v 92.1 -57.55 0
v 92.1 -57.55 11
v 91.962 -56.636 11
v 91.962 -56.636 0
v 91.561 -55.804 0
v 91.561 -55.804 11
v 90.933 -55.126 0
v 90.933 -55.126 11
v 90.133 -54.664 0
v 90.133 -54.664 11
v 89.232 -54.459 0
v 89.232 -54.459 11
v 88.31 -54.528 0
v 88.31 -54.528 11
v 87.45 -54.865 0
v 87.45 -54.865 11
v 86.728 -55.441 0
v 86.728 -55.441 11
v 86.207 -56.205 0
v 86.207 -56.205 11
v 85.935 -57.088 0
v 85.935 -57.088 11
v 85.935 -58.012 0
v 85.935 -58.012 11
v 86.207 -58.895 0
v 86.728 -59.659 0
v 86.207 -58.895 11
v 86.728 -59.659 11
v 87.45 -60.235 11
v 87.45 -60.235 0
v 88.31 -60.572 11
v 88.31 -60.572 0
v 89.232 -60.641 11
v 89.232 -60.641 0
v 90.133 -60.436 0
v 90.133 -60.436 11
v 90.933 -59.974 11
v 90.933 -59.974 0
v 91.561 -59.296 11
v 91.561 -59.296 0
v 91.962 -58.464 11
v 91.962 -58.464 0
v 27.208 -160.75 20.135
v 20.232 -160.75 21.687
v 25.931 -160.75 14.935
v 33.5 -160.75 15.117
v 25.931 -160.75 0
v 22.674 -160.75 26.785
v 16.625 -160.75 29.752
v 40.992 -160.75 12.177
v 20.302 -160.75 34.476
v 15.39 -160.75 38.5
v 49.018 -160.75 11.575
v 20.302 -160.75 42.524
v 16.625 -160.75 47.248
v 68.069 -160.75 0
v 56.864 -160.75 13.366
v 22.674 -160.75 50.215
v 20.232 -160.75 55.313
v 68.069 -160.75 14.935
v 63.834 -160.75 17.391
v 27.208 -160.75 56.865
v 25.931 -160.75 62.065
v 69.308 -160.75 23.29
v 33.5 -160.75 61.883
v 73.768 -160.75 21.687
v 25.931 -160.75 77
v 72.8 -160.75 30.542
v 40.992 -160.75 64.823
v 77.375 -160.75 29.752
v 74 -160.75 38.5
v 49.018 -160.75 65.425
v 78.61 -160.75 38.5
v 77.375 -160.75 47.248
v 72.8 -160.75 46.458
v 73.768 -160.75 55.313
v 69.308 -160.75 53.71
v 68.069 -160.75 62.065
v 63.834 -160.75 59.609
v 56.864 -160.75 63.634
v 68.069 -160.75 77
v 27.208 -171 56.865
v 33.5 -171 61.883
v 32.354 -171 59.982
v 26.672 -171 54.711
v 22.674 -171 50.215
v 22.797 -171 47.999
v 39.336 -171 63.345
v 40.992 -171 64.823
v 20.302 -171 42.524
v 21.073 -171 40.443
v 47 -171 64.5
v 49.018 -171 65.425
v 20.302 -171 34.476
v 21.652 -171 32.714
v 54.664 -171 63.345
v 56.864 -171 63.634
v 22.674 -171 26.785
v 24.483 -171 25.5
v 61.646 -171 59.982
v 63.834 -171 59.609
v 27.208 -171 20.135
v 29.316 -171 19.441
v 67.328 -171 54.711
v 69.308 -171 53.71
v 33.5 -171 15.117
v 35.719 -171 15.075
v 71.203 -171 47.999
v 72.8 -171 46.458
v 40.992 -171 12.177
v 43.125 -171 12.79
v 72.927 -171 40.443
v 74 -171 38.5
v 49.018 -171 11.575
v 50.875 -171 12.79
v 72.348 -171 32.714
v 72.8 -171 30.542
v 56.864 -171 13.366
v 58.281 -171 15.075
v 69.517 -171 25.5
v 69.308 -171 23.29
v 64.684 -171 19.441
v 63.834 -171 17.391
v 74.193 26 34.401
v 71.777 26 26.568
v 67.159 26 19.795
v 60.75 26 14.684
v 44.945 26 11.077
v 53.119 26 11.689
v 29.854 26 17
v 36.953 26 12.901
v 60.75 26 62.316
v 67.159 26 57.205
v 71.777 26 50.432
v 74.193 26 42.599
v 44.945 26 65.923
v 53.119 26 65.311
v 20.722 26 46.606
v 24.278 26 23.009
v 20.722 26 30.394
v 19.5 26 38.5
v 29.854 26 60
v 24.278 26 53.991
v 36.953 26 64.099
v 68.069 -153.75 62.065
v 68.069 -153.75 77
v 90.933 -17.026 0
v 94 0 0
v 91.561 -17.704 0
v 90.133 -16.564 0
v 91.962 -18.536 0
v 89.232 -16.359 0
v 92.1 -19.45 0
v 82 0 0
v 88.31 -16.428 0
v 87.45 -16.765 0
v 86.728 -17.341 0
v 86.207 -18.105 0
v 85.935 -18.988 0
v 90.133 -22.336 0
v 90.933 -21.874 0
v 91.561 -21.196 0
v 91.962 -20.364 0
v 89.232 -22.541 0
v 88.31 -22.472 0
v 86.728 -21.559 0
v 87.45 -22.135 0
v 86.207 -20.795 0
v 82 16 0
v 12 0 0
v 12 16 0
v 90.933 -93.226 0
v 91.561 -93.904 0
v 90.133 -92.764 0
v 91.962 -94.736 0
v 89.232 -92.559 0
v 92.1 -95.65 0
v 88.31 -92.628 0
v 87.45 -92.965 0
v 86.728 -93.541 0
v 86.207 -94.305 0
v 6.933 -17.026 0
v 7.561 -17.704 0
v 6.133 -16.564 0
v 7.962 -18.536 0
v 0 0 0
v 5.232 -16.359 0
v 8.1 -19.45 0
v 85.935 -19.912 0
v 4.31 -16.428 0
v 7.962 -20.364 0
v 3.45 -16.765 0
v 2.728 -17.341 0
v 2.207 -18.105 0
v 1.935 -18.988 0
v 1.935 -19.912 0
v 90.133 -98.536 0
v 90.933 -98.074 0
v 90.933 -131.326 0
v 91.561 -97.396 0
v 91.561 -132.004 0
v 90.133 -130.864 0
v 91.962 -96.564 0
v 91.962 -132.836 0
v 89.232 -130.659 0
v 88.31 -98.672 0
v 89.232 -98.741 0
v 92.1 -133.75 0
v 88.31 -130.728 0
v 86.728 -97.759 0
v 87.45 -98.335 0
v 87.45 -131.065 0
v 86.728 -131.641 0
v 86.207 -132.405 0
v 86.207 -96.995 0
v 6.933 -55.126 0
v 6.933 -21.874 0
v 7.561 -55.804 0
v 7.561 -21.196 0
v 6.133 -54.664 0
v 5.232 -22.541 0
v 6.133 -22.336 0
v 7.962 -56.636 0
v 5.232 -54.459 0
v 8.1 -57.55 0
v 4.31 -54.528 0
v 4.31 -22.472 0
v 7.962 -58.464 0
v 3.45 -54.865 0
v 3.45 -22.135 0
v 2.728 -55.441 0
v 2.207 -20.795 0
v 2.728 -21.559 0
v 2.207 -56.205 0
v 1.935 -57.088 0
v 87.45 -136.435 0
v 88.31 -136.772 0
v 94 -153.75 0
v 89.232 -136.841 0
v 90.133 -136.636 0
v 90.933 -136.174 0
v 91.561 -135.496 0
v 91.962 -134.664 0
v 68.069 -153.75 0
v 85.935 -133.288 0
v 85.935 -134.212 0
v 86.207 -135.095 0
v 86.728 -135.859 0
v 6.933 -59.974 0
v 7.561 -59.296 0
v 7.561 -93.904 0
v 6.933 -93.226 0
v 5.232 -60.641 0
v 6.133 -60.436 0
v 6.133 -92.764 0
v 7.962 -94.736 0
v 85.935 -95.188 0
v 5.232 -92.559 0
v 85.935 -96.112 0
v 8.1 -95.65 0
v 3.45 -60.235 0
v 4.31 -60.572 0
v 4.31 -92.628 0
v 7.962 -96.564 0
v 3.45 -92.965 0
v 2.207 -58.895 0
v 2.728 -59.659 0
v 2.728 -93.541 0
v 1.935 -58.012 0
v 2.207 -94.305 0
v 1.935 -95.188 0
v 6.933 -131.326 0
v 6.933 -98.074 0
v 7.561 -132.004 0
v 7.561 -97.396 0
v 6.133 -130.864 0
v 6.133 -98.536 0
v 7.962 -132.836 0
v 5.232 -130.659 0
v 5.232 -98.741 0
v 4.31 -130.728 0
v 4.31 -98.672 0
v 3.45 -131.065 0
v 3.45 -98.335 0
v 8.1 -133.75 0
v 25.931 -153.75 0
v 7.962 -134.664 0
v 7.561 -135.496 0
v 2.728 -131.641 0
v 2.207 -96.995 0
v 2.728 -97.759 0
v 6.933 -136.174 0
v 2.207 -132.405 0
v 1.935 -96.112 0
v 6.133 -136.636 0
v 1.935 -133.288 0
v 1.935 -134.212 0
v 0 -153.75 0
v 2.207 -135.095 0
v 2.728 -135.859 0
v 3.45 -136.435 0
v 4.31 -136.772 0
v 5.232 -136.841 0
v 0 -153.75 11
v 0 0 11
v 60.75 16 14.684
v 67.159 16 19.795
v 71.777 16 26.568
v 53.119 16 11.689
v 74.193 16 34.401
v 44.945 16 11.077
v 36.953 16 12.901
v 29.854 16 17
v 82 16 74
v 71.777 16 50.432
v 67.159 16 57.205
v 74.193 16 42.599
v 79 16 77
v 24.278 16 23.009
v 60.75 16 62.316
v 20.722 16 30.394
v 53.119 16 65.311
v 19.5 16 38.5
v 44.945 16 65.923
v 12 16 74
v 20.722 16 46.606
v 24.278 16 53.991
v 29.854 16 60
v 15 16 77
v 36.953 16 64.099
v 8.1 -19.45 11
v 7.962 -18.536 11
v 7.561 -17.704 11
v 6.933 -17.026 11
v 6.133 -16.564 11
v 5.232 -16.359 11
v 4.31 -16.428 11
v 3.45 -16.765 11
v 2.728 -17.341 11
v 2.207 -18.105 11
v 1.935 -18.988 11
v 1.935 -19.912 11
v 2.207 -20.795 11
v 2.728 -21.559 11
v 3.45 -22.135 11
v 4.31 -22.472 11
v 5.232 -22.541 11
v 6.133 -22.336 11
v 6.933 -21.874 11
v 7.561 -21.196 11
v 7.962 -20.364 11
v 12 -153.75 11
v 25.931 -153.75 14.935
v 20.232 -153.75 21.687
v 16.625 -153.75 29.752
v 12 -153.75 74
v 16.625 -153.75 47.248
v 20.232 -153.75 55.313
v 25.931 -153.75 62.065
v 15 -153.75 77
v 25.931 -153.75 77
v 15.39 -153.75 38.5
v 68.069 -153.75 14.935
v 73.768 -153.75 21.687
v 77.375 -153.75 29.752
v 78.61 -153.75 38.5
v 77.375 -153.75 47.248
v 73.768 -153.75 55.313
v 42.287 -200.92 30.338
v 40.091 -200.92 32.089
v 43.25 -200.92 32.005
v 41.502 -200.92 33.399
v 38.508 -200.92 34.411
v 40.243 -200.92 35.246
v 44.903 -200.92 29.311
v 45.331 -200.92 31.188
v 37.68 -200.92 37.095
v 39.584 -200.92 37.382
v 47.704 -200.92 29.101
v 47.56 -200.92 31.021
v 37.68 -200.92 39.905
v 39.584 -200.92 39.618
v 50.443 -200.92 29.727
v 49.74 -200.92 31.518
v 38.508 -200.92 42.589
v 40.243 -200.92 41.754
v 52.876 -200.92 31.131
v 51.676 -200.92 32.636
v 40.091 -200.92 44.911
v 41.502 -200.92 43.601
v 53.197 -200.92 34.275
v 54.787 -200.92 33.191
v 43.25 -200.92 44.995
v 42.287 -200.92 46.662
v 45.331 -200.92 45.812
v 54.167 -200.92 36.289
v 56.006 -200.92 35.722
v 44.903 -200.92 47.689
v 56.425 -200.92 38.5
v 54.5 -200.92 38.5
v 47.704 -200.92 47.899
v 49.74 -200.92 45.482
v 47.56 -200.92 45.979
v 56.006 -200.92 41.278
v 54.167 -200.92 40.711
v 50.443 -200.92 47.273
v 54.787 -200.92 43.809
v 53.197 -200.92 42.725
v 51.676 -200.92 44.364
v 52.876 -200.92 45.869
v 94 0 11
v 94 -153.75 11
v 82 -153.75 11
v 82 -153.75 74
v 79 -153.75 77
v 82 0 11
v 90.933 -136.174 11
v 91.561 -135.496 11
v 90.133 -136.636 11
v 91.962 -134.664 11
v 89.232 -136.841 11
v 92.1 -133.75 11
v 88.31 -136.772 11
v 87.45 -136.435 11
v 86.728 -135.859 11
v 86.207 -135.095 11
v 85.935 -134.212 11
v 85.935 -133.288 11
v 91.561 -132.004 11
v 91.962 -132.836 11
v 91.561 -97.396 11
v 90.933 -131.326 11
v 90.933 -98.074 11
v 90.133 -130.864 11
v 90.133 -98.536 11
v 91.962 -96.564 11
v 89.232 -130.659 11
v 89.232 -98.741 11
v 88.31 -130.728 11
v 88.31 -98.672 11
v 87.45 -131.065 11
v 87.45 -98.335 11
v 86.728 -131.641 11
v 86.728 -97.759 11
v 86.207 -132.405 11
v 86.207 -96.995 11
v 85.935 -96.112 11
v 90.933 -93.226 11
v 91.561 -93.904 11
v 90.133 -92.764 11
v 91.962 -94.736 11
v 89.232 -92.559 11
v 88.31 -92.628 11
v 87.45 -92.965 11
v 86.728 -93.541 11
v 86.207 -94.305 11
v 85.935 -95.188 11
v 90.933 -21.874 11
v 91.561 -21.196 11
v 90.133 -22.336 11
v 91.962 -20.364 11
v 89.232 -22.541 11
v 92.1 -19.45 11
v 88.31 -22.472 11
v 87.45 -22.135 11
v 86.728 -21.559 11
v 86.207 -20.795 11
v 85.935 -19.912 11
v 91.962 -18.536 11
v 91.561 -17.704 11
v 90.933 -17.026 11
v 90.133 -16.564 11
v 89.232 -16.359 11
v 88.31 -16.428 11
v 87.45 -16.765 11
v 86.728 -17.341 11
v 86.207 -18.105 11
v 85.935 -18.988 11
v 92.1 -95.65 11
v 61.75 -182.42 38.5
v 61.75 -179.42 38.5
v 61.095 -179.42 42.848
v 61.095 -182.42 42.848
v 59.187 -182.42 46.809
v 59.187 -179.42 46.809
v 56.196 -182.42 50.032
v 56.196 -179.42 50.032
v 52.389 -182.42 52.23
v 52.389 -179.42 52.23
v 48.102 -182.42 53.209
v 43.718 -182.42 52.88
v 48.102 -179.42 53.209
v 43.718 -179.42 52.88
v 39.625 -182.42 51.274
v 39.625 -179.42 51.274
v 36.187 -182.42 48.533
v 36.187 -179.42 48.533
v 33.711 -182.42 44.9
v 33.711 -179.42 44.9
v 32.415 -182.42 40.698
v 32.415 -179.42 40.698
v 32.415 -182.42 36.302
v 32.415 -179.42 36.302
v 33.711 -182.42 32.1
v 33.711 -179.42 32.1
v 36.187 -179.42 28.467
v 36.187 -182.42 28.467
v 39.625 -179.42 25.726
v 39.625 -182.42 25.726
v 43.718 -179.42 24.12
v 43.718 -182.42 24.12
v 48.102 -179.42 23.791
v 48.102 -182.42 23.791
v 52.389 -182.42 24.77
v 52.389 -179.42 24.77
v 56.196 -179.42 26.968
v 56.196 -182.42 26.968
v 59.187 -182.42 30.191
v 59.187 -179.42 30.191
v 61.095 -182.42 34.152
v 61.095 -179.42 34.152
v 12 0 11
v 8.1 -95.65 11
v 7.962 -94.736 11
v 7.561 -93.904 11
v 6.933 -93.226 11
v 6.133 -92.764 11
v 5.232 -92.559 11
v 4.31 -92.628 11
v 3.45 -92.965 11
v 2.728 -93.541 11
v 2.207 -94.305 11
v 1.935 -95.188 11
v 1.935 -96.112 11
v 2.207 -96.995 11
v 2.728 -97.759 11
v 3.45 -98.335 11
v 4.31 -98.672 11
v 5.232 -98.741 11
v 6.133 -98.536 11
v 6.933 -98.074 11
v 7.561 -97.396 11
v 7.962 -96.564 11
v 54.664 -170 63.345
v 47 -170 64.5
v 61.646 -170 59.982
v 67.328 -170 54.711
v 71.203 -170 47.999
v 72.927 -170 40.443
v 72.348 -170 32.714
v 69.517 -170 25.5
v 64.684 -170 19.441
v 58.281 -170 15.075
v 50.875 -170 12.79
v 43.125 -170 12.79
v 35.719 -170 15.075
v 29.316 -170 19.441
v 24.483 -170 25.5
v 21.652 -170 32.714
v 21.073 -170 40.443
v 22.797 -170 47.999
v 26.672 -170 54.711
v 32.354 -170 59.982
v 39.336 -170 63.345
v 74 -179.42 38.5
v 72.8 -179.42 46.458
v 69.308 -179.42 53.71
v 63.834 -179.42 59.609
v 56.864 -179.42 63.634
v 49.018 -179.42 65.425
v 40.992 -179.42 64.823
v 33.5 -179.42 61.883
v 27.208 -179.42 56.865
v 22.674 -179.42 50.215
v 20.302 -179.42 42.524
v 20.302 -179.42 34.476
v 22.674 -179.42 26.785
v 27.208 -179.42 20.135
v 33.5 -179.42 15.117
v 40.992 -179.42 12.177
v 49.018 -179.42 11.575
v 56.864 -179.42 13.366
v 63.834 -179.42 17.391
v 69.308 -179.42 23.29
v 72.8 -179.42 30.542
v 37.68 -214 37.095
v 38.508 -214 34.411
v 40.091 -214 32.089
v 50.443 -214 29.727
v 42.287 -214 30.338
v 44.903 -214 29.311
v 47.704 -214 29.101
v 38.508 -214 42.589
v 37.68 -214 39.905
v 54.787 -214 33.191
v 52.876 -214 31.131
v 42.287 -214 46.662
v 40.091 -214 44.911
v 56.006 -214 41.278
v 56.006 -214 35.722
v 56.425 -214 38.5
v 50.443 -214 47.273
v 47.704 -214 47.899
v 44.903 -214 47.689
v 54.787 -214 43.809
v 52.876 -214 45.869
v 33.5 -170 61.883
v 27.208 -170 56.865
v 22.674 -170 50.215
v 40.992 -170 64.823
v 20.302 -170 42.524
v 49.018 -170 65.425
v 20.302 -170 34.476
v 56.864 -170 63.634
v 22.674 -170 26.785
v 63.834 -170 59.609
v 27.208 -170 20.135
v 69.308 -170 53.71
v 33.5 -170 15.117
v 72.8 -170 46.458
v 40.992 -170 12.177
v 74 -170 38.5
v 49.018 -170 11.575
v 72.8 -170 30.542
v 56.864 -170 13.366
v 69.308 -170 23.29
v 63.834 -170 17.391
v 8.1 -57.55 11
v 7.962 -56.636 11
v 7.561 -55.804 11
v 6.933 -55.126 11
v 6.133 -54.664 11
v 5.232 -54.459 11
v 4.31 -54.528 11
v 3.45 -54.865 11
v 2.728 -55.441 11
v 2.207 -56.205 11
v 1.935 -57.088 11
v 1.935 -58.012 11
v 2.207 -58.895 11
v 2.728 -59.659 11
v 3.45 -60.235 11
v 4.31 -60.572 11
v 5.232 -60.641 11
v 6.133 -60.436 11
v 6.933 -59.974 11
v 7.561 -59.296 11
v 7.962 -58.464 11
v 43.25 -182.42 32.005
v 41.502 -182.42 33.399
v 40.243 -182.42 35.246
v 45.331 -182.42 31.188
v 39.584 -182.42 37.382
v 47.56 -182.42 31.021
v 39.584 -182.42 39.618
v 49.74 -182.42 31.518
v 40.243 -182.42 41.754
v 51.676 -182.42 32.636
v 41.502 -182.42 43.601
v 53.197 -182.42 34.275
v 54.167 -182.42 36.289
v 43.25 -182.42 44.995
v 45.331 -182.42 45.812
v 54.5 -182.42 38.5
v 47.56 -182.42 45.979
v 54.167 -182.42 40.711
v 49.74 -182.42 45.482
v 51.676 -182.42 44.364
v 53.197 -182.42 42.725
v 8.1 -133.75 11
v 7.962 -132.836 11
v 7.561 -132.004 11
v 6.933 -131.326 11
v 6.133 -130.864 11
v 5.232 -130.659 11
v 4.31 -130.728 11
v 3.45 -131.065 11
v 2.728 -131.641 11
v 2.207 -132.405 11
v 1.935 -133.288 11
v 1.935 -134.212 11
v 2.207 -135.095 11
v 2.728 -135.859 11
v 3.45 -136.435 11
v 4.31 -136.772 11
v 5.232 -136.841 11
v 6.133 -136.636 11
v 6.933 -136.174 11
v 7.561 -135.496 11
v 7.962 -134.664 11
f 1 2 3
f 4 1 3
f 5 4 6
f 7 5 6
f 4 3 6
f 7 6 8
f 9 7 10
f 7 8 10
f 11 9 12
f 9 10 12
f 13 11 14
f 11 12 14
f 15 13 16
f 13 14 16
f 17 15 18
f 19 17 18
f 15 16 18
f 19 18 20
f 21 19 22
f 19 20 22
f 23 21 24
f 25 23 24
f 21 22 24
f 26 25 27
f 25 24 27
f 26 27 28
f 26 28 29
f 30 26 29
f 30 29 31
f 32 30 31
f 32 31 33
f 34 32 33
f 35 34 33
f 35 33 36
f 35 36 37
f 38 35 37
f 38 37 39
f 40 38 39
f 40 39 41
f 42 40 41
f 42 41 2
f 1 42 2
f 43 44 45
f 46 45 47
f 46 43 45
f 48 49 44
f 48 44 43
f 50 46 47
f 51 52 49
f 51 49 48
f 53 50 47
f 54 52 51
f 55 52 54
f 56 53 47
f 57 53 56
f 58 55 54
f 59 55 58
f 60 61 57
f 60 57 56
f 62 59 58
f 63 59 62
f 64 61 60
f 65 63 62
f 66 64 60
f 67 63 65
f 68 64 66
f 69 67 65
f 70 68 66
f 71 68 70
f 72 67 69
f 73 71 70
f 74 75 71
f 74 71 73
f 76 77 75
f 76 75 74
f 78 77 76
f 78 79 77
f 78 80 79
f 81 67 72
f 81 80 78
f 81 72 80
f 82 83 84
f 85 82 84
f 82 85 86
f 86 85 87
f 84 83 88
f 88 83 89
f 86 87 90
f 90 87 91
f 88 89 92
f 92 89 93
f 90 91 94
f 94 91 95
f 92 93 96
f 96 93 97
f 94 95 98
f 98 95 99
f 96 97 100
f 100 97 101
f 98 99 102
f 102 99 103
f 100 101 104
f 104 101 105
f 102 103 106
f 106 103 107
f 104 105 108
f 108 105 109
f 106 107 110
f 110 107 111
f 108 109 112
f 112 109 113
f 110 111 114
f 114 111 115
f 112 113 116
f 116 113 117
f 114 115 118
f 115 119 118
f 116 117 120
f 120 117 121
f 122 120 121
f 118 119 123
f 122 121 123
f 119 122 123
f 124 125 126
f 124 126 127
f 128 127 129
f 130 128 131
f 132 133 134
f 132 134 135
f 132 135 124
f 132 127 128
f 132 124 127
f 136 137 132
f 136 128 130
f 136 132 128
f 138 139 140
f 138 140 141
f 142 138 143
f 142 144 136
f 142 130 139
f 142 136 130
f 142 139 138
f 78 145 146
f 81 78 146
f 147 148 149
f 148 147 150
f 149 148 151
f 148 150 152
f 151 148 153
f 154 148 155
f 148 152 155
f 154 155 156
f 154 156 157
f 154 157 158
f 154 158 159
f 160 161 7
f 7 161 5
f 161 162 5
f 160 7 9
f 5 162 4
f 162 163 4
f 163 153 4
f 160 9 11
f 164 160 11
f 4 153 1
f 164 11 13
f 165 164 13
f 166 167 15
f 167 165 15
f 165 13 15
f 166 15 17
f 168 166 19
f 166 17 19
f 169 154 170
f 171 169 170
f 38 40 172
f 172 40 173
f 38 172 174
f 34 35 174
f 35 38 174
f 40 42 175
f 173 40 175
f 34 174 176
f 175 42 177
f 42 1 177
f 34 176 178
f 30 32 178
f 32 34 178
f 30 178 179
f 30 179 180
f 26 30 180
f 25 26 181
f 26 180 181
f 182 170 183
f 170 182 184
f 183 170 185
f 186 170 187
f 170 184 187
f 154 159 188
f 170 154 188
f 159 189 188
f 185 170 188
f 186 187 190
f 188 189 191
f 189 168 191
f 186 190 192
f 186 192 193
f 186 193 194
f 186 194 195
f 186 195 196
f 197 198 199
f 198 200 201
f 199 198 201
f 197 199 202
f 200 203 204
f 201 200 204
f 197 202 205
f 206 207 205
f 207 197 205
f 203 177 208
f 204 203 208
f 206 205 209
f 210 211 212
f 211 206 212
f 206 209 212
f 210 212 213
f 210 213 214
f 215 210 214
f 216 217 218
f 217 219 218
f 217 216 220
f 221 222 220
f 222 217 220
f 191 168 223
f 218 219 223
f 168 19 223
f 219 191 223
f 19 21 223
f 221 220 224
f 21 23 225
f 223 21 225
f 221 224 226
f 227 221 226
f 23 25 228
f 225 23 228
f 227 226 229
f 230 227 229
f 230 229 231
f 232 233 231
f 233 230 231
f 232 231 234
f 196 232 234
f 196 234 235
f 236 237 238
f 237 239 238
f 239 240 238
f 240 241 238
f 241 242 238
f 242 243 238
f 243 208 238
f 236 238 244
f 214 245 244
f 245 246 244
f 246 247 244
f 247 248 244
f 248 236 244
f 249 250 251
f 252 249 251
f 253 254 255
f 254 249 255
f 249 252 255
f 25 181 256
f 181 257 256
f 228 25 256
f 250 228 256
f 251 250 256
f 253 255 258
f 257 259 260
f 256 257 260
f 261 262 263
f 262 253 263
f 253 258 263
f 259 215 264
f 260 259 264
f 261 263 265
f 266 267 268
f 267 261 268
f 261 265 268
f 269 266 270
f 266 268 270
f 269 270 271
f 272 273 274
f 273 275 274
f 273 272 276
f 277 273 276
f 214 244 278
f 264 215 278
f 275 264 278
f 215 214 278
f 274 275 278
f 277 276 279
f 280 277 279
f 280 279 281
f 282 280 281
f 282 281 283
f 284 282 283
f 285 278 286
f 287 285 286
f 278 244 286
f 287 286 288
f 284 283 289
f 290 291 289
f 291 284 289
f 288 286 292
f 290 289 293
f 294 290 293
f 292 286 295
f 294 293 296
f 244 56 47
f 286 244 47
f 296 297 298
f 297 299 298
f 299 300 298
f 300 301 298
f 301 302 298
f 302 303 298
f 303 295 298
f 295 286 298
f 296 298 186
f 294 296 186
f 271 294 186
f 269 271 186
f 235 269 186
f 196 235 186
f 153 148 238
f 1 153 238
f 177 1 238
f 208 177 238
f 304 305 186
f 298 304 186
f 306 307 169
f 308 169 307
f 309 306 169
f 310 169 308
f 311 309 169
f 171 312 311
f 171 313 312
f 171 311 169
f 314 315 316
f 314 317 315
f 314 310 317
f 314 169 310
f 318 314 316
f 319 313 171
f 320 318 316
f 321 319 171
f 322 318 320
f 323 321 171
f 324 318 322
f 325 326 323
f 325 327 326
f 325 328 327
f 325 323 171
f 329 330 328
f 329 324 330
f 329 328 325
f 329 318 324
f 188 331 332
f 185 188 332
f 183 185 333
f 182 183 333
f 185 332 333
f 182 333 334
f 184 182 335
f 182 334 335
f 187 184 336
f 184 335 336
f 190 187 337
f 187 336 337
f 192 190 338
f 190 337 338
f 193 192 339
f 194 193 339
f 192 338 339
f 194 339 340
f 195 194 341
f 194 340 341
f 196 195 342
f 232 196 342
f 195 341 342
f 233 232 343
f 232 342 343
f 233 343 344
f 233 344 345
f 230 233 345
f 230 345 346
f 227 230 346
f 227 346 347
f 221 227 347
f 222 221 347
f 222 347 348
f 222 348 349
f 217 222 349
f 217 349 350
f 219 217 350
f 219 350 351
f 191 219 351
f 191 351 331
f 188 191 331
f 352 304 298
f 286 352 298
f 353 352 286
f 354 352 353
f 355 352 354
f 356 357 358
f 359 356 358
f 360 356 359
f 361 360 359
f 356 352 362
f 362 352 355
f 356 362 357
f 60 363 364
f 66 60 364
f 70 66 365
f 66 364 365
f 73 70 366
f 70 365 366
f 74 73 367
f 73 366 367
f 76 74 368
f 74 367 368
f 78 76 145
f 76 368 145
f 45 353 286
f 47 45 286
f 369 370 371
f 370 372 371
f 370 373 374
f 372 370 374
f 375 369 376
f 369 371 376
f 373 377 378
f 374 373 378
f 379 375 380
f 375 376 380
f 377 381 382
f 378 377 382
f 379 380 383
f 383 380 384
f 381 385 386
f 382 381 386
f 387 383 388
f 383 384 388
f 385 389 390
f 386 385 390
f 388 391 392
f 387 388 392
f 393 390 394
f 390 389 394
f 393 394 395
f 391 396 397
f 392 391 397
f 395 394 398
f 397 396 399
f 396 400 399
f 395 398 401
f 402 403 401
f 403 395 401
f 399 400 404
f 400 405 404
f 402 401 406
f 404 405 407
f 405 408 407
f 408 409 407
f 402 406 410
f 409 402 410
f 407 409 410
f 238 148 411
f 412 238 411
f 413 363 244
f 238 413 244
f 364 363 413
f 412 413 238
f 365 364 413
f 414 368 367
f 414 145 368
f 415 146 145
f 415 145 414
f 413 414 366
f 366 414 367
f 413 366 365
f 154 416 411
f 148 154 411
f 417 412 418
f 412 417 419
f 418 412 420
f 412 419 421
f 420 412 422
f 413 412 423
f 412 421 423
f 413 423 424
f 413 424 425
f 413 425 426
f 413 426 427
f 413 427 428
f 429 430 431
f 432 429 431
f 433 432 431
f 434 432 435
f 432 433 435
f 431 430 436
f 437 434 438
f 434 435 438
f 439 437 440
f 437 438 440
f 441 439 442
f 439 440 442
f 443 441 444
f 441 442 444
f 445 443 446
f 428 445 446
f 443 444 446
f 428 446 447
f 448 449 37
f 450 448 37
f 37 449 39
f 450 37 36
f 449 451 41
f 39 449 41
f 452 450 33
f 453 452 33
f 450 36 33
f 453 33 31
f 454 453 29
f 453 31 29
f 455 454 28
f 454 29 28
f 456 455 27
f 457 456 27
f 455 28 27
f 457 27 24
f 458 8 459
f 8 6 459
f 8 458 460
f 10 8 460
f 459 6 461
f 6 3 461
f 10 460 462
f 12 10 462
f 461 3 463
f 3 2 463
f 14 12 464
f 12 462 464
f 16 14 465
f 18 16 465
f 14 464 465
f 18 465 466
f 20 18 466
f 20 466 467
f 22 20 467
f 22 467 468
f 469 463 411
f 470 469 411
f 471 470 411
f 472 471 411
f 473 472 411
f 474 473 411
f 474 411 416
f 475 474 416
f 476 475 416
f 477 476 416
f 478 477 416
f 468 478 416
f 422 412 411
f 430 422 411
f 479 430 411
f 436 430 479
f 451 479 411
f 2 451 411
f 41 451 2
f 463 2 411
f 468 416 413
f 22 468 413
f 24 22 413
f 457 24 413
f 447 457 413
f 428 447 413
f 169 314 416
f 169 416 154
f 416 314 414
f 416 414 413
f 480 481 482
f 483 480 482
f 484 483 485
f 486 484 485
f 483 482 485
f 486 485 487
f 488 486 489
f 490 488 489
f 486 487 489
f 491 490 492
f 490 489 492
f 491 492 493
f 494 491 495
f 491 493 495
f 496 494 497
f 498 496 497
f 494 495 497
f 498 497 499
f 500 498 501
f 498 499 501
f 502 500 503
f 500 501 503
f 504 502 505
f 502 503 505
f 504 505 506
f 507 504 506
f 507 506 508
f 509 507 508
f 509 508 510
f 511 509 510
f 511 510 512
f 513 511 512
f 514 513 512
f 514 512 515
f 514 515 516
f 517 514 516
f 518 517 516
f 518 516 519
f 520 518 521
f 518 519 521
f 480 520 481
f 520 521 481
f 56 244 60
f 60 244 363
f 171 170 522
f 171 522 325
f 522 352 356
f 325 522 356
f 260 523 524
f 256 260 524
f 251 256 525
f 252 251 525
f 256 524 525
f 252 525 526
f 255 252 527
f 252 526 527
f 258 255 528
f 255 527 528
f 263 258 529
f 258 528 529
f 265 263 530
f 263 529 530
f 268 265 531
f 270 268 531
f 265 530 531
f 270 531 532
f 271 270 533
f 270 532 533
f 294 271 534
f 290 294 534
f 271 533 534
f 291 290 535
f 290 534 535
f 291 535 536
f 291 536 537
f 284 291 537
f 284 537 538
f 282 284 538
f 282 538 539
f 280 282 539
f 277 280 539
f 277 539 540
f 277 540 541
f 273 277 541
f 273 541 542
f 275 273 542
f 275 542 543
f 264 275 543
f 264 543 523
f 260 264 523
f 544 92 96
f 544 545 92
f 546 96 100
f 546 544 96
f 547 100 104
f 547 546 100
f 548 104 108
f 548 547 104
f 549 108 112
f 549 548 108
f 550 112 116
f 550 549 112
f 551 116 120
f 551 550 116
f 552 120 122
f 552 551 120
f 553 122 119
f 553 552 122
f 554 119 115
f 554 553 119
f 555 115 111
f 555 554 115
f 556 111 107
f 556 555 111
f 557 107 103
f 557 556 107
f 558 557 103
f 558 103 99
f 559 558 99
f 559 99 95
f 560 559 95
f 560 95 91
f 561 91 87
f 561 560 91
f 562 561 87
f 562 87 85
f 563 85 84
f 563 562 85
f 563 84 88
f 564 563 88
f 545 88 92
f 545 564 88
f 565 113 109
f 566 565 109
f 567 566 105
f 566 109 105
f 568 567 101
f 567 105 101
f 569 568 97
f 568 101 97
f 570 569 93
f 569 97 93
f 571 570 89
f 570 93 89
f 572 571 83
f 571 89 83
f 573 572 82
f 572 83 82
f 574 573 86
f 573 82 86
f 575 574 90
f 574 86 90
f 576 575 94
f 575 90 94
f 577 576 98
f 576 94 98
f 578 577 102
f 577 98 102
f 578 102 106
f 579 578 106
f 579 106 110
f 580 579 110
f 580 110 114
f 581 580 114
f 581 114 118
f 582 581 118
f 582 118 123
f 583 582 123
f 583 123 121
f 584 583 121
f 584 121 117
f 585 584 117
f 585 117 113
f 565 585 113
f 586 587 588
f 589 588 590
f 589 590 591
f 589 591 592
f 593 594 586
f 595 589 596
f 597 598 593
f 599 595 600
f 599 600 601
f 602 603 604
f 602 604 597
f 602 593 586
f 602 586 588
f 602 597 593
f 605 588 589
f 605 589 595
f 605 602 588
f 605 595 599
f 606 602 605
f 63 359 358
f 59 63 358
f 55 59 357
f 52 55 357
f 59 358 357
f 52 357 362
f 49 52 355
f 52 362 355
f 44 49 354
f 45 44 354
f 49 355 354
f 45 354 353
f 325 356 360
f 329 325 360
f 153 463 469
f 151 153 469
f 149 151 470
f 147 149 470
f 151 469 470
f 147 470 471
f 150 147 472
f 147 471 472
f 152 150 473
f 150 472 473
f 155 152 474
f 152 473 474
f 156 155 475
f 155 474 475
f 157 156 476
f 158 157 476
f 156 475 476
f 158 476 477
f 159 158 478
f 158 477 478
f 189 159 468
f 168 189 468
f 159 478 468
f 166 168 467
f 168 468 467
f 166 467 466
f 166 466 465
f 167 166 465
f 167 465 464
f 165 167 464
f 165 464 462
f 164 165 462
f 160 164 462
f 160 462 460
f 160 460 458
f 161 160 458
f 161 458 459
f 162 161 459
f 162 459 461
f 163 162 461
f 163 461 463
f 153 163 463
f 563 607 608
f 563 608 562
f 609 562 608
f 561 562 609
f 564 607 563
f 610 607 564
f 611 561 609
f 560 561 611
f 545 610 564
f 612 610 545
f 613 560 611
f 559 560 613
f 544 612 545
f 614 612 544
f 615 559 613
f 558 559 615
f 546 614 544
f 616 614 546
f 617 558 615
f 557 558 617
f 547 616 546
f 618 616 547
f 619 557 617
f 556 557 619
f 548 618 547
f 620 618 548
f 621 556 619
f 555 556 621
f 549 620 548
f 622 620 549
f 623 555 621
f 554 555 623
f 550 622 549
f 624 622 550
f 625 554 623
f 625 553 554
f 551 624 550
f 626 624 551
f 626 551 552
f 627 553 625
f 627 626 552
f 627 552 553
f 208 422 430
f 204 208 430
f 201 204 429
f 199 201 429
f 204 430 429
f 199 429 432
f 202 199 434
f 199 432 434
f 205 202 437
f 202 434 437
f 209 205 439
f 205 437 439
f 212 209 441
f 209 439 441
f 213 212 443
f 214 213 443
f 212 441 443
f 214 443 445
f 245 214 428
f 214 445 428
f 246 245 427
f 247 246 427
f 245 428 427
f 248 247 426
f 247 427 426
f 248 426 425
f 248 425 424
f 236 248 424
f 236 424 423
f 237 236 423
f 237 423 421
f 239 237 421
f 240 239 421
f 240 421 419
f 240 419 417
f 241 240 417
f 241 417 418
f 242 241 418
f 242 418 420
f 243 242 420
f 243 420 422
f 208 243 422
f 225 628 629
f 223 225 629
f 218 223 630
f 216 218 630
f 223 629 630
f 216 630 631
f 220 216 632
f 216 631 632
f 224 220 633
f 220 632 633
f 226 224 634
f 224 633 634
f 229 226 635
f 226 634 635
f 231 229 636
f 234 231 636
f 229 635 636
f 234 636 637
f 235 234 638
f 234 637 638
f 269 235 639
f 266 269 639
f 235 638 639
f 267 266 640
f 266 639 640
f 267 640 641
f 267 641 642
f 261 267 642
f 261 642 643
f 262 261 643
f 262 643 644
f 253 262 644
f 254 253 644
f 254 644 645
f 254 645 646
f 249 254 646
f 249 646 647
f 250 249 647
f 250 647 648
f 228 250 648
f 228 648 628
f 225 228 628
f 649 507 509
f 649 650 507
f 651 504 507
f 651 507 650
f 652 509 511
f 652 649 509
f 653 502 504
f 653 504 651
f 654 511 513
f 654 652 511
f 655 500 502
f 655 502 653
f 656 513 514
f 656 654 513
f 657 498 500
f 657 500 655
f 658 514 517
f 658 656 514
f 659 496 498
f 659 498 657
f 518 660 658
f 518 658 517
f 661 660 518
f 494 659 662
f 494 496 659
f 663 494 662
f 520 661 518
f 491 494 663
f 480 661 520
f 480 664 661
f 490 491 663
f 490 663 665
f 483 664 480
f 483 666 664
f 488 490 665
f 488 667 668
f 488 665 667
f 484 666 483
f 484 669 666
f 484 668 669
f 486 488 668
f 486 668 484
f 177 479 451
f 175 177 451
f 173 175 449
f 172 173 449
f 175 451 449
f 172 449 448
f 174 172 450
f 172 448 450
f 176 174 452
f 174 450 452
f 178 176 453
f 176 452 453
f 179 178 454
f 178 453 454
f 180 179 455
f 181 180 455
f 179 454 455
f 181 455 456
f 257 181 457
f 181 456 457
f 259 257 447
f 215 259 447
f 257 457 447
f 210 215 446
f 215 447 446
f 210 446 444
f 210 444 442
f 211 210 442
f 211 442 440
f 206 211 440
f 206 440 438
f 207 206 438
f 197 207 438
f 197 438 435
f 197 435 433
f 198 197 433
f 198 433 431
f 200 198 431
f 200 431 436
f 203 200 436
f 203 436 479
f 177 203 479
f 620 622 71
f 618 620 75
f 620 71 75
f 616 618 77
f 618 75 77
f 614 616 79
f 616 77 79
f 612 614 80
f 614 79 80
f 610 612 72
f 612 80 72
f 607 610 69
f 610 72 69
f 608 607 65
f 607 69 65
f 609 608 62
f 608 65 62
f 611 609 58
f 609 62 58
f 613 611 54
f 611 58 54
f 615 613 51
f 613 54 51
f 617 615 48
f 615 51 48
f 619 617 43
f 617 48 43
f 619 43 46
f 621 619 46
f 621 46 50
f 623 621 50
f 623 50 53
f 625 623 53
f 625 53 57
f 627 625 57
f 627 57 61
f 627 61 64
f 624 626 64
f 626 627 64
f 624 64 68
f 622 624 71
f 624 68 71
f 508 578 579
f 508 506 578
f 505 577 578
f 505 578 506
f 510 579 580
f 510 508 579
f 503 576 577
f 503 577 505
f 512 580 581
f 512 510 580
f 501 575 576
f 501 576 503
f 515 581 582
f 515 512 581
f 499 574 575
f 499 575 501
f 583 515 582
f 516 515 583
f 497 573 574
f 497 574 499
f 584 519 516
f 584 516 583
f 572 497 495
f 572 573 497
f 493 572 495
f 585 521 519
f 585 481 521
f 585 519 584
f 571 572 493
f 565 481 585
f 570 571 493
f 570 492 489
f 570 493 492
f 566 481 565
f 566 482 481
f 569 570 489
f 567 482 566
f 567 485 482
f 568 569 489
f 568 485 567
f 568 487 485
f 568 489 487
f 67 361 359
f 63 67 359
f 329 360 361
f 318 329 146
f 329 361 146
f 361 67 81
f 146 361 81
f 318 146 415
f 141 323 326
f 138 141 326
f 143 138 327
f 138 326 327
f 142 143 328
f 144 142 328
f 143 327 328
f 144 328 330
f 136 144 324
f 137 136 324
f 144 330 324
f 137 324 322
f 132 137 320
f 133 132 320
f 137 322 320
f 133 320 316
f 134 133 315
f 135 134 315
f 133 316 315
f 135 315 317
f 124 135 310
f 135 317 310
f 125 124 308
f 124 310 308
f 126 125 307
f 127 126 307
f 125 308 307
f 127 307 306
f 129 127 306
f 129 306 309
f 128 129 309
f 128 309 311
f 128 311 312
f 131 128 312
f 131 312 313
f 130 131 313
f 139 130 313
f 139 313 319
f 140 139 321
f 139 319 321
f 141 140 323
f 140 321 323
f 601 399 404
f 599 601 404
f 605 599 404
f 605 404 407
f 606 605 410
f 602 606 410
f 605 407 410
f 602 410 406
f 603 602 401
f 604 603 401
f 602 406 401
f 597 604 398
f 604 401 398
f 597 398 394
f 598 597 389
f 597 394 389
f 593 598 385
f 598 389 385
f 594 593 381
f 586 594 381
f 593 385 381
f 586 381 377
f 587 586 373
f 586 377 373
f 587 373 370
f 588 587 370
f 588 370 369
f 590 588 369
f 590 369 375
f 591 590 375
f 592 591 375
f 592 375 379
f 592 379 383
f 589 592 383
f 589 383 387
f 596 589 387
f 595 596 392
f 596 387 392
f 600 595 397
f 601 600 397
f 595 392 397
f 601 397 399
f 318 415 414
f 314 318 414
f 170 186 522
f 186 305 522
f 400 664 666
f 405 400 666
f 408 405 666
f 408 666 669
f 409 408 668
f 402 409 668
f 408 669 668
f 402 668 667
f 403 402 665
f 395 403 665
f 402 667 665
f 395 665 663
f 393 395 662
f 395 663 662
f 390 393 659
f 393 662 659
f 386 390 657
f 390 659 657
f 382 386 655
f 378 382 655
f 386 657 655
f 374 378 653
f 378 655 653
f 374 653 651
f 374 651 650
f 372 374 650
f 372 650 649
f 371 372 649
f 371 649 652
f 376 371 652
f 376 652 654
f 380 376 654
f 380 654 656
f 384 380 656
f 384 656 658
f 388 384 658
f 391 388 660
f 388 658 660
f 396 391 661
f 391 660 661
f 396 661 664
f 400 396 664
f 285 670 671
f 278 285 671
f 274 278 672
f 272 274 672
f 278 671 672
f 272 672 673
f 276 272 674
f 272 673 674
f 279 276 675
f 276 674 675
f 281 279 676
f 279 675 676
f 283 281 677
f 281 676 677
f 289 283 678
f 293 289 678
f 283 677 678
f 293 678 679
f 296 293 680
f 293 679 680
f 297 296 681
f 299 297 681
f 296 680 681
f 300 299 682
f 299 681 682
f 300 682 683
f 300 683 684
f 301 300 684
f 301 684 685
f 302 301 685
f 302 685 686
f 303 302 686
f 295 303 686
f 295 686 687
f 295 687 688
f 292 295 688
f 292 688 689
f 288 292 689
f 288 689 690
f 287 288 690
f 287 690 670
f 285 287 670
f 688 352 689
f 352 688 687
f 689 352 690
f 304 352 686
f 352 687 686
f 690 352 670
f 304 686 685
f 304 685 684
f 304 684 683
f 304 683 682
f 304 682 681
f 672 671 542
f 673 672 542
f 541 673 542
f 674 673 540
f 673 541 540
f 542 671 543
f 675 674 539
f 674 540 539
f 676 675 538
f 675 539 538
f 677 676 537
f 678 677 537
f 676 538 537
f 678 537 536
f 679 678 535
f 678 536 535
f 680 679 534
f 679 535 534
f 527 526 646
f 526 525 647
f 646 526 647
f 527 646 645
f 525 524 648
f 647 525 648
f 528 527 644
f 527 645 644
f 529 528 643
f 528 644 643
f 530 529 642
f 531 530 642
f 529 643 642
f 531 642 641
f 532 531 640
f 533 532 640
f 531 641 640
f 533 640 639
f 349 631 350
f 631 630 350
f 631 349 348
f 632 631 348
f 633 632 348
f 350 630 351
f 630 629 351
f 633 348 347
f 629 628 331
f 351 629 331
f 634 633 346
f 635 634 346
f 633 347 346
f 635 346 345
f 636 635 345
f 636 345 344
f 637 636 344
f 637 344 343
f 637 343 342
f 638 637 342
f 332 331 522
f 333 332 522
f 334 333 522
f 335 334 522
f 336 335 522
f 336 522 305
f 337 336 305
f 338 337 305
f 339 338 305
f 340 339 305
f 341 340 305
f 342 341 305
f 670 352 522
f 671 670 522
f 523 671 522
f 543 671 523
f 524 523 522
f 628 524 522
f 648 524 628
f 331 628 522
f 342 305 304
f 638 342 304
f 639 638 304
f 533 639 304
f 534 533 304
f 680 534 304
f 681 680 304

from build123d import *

# Parameters (mm, degrees)
F1_DEPTH  = 153.75
F2_SIZE   = 3
F3_R      = 3.1
F4_DEPTH  = 11.001
F6_DEPTH  = 7
F7_R      = 27
F8_DEPTH  = 18.67
F9_R      = 14.75
F10_DEPTH = 3
F12_W     = 1
F12_H     = 1
F14_R     = 7.5
F15_DEPTH = 18.5
F16_R     = 9.425
F16_R_2   = 7.5
F17_DEPTH = 13.08
F19_DEPTH = 16
F20_R     = 27.5
F21_DEPTH = 10


# Not quite as in the source:
# - the program builds the solid bodies; features that only make, move or delete a surface that nothing else refers to are left out


with BuildPart() as f1:
    # F0 (on Front) → F1 (new body)
    with BuildSketch(Plane.XZ):
        Polygon((0, 11), (0, 0), (94, 0), (94, 11), (82, 11), (82, 77), (12, 77), (12, 11), align=None)
    extrude(amount=F1_DEPTH)

    # F2
    f2_edges = [f1.edges().sort_by_distance(p)[0] for p in [
        (12, -76.875, 77),
        (82, -76.875, 77),
    ]]
    chamfer(f2_edges, length=F2_SIZE)

    # F3 (on face) → F4 (cut, through all)
    with BuildSketch(Plane.XY.offset(11)):
        with Locations((89, -133.75)):
            Circle(F3_R)
        with Locations((89, -95.65)):
            Circle(F3_R)
        with Locations((89, -57.55)):
            Circle(F3_R)
        with Locations((89, -19.45)):
            Circle(F3_R)
        with Locations((5, -19.45)):
            Circle(F3_R)
        with Locations((5, -57.55)):
            Circle(F3_R)
        with Locations((5, -95.65)):
            Circle(F3_R)
        with Locations((5, -133.75)):
            Circle(F3_R)
    extrude(amount=-F4_DEPTH, mode=Mode.SUBTRACT)

    # F5 (on face) → F6 (join)
    with BuildSketch(Plane.XZ.offset(153.75)):
        with BuildLine():
            Line((25.9310321962, 77), (25.9310321962, 62.0646068434))
            ThreePointArc((25.9310321962, 62.0646068434), (15.39, 38.5), (25.9310321962, 14.9353931566))
            Line((25.9310321962, 14.9353931566), (25.9310321962, 0))
            Line((25.9310321962, 0), (68.0689678038, 0))
            Line((68.0689678038, 0), (68.0689678038, 14.9353931566))
            ThreePointArc((68.0689678038, 14.9353931566), (78.61, 38.5), (68.0689678038, 62.0646068434))
            Line((68.0689678038, 62.0646068434), (68.0689678038, 77))
            Line((68.0689678038, 77), (25.9310321962, 77))
        make_face()
    extrude(amount=F6_DEPTH)

    # F7 (on face) → F8 (join)
    with BuildSketch(Plane.XZ.offset(160.75)):
        with Locations((47, 38.5)):
            Circle(F7_R)
    extrude(amount=F8_DEPTH)

    # F9 (on face) → F10 (join)
    with BuildSketch(Plane.XZ.offset(179.42)):
        with Locations((47, 38.5)):
            Circle(F9_R)
    extrude(amount=F10_DEPTH)

    # F12 (on offset) → F13 (revolve, cut)
    with BuildSketch(Plane.YZ.offset(47)):
        with Locations((-170.5, 65)):
            Rectangle(F12_W, F12_H)
    revolve(axis=Axis((47, -160.75, 38.5), (0, 1, 0)), mode=Mode.SUBTRACT)

    # F14 (on face) → F15 (join)
    with BuildSketch(Plane.XZ.offset(182.42)):
        with Locations((47, 38.5)):
            Circle(F14_R)
    extrude(amount=F15_DEPTH)

    # F16 (on face) → F17 (join)
    with BuildSketch(Plane.XZ.offset(200.92)):
        with Locations((47, 38.5)):
            Circle(F16_R)
        with Locations((47, 38.5)):
            Circle(F16_R_2, mode=Mode.SUBTRACT)
        with Locations((47, 38.5)):
            Circle(F16_R_2)
    extrude(amount=F17_DEPTH)

    # F18 (on face) → F19 (join)
    with BuildSketch(Plane(origin=(0, 0, 0), x_dir=(-1, 0, 0), z_dir=(0, 1, 0))):
        Polygon((-79, 77), (-82, 74), (-82, 0), (-12, 0), (-12, 74), (-15, 77), align=None)
    extrude(amount=F19_DEPTH)

    # F20 (on face) → F21 (join)
    with BuildSketch(Plane(origin=(0, 16, 0), x_dir=(-1, 0, 0), z_dir=(0, 1, 0))):
        with Locations((-47, 38.5)):
            Circle(F20_R)
    extrude(amount=F21_DEPTH)


solid = f1.part
